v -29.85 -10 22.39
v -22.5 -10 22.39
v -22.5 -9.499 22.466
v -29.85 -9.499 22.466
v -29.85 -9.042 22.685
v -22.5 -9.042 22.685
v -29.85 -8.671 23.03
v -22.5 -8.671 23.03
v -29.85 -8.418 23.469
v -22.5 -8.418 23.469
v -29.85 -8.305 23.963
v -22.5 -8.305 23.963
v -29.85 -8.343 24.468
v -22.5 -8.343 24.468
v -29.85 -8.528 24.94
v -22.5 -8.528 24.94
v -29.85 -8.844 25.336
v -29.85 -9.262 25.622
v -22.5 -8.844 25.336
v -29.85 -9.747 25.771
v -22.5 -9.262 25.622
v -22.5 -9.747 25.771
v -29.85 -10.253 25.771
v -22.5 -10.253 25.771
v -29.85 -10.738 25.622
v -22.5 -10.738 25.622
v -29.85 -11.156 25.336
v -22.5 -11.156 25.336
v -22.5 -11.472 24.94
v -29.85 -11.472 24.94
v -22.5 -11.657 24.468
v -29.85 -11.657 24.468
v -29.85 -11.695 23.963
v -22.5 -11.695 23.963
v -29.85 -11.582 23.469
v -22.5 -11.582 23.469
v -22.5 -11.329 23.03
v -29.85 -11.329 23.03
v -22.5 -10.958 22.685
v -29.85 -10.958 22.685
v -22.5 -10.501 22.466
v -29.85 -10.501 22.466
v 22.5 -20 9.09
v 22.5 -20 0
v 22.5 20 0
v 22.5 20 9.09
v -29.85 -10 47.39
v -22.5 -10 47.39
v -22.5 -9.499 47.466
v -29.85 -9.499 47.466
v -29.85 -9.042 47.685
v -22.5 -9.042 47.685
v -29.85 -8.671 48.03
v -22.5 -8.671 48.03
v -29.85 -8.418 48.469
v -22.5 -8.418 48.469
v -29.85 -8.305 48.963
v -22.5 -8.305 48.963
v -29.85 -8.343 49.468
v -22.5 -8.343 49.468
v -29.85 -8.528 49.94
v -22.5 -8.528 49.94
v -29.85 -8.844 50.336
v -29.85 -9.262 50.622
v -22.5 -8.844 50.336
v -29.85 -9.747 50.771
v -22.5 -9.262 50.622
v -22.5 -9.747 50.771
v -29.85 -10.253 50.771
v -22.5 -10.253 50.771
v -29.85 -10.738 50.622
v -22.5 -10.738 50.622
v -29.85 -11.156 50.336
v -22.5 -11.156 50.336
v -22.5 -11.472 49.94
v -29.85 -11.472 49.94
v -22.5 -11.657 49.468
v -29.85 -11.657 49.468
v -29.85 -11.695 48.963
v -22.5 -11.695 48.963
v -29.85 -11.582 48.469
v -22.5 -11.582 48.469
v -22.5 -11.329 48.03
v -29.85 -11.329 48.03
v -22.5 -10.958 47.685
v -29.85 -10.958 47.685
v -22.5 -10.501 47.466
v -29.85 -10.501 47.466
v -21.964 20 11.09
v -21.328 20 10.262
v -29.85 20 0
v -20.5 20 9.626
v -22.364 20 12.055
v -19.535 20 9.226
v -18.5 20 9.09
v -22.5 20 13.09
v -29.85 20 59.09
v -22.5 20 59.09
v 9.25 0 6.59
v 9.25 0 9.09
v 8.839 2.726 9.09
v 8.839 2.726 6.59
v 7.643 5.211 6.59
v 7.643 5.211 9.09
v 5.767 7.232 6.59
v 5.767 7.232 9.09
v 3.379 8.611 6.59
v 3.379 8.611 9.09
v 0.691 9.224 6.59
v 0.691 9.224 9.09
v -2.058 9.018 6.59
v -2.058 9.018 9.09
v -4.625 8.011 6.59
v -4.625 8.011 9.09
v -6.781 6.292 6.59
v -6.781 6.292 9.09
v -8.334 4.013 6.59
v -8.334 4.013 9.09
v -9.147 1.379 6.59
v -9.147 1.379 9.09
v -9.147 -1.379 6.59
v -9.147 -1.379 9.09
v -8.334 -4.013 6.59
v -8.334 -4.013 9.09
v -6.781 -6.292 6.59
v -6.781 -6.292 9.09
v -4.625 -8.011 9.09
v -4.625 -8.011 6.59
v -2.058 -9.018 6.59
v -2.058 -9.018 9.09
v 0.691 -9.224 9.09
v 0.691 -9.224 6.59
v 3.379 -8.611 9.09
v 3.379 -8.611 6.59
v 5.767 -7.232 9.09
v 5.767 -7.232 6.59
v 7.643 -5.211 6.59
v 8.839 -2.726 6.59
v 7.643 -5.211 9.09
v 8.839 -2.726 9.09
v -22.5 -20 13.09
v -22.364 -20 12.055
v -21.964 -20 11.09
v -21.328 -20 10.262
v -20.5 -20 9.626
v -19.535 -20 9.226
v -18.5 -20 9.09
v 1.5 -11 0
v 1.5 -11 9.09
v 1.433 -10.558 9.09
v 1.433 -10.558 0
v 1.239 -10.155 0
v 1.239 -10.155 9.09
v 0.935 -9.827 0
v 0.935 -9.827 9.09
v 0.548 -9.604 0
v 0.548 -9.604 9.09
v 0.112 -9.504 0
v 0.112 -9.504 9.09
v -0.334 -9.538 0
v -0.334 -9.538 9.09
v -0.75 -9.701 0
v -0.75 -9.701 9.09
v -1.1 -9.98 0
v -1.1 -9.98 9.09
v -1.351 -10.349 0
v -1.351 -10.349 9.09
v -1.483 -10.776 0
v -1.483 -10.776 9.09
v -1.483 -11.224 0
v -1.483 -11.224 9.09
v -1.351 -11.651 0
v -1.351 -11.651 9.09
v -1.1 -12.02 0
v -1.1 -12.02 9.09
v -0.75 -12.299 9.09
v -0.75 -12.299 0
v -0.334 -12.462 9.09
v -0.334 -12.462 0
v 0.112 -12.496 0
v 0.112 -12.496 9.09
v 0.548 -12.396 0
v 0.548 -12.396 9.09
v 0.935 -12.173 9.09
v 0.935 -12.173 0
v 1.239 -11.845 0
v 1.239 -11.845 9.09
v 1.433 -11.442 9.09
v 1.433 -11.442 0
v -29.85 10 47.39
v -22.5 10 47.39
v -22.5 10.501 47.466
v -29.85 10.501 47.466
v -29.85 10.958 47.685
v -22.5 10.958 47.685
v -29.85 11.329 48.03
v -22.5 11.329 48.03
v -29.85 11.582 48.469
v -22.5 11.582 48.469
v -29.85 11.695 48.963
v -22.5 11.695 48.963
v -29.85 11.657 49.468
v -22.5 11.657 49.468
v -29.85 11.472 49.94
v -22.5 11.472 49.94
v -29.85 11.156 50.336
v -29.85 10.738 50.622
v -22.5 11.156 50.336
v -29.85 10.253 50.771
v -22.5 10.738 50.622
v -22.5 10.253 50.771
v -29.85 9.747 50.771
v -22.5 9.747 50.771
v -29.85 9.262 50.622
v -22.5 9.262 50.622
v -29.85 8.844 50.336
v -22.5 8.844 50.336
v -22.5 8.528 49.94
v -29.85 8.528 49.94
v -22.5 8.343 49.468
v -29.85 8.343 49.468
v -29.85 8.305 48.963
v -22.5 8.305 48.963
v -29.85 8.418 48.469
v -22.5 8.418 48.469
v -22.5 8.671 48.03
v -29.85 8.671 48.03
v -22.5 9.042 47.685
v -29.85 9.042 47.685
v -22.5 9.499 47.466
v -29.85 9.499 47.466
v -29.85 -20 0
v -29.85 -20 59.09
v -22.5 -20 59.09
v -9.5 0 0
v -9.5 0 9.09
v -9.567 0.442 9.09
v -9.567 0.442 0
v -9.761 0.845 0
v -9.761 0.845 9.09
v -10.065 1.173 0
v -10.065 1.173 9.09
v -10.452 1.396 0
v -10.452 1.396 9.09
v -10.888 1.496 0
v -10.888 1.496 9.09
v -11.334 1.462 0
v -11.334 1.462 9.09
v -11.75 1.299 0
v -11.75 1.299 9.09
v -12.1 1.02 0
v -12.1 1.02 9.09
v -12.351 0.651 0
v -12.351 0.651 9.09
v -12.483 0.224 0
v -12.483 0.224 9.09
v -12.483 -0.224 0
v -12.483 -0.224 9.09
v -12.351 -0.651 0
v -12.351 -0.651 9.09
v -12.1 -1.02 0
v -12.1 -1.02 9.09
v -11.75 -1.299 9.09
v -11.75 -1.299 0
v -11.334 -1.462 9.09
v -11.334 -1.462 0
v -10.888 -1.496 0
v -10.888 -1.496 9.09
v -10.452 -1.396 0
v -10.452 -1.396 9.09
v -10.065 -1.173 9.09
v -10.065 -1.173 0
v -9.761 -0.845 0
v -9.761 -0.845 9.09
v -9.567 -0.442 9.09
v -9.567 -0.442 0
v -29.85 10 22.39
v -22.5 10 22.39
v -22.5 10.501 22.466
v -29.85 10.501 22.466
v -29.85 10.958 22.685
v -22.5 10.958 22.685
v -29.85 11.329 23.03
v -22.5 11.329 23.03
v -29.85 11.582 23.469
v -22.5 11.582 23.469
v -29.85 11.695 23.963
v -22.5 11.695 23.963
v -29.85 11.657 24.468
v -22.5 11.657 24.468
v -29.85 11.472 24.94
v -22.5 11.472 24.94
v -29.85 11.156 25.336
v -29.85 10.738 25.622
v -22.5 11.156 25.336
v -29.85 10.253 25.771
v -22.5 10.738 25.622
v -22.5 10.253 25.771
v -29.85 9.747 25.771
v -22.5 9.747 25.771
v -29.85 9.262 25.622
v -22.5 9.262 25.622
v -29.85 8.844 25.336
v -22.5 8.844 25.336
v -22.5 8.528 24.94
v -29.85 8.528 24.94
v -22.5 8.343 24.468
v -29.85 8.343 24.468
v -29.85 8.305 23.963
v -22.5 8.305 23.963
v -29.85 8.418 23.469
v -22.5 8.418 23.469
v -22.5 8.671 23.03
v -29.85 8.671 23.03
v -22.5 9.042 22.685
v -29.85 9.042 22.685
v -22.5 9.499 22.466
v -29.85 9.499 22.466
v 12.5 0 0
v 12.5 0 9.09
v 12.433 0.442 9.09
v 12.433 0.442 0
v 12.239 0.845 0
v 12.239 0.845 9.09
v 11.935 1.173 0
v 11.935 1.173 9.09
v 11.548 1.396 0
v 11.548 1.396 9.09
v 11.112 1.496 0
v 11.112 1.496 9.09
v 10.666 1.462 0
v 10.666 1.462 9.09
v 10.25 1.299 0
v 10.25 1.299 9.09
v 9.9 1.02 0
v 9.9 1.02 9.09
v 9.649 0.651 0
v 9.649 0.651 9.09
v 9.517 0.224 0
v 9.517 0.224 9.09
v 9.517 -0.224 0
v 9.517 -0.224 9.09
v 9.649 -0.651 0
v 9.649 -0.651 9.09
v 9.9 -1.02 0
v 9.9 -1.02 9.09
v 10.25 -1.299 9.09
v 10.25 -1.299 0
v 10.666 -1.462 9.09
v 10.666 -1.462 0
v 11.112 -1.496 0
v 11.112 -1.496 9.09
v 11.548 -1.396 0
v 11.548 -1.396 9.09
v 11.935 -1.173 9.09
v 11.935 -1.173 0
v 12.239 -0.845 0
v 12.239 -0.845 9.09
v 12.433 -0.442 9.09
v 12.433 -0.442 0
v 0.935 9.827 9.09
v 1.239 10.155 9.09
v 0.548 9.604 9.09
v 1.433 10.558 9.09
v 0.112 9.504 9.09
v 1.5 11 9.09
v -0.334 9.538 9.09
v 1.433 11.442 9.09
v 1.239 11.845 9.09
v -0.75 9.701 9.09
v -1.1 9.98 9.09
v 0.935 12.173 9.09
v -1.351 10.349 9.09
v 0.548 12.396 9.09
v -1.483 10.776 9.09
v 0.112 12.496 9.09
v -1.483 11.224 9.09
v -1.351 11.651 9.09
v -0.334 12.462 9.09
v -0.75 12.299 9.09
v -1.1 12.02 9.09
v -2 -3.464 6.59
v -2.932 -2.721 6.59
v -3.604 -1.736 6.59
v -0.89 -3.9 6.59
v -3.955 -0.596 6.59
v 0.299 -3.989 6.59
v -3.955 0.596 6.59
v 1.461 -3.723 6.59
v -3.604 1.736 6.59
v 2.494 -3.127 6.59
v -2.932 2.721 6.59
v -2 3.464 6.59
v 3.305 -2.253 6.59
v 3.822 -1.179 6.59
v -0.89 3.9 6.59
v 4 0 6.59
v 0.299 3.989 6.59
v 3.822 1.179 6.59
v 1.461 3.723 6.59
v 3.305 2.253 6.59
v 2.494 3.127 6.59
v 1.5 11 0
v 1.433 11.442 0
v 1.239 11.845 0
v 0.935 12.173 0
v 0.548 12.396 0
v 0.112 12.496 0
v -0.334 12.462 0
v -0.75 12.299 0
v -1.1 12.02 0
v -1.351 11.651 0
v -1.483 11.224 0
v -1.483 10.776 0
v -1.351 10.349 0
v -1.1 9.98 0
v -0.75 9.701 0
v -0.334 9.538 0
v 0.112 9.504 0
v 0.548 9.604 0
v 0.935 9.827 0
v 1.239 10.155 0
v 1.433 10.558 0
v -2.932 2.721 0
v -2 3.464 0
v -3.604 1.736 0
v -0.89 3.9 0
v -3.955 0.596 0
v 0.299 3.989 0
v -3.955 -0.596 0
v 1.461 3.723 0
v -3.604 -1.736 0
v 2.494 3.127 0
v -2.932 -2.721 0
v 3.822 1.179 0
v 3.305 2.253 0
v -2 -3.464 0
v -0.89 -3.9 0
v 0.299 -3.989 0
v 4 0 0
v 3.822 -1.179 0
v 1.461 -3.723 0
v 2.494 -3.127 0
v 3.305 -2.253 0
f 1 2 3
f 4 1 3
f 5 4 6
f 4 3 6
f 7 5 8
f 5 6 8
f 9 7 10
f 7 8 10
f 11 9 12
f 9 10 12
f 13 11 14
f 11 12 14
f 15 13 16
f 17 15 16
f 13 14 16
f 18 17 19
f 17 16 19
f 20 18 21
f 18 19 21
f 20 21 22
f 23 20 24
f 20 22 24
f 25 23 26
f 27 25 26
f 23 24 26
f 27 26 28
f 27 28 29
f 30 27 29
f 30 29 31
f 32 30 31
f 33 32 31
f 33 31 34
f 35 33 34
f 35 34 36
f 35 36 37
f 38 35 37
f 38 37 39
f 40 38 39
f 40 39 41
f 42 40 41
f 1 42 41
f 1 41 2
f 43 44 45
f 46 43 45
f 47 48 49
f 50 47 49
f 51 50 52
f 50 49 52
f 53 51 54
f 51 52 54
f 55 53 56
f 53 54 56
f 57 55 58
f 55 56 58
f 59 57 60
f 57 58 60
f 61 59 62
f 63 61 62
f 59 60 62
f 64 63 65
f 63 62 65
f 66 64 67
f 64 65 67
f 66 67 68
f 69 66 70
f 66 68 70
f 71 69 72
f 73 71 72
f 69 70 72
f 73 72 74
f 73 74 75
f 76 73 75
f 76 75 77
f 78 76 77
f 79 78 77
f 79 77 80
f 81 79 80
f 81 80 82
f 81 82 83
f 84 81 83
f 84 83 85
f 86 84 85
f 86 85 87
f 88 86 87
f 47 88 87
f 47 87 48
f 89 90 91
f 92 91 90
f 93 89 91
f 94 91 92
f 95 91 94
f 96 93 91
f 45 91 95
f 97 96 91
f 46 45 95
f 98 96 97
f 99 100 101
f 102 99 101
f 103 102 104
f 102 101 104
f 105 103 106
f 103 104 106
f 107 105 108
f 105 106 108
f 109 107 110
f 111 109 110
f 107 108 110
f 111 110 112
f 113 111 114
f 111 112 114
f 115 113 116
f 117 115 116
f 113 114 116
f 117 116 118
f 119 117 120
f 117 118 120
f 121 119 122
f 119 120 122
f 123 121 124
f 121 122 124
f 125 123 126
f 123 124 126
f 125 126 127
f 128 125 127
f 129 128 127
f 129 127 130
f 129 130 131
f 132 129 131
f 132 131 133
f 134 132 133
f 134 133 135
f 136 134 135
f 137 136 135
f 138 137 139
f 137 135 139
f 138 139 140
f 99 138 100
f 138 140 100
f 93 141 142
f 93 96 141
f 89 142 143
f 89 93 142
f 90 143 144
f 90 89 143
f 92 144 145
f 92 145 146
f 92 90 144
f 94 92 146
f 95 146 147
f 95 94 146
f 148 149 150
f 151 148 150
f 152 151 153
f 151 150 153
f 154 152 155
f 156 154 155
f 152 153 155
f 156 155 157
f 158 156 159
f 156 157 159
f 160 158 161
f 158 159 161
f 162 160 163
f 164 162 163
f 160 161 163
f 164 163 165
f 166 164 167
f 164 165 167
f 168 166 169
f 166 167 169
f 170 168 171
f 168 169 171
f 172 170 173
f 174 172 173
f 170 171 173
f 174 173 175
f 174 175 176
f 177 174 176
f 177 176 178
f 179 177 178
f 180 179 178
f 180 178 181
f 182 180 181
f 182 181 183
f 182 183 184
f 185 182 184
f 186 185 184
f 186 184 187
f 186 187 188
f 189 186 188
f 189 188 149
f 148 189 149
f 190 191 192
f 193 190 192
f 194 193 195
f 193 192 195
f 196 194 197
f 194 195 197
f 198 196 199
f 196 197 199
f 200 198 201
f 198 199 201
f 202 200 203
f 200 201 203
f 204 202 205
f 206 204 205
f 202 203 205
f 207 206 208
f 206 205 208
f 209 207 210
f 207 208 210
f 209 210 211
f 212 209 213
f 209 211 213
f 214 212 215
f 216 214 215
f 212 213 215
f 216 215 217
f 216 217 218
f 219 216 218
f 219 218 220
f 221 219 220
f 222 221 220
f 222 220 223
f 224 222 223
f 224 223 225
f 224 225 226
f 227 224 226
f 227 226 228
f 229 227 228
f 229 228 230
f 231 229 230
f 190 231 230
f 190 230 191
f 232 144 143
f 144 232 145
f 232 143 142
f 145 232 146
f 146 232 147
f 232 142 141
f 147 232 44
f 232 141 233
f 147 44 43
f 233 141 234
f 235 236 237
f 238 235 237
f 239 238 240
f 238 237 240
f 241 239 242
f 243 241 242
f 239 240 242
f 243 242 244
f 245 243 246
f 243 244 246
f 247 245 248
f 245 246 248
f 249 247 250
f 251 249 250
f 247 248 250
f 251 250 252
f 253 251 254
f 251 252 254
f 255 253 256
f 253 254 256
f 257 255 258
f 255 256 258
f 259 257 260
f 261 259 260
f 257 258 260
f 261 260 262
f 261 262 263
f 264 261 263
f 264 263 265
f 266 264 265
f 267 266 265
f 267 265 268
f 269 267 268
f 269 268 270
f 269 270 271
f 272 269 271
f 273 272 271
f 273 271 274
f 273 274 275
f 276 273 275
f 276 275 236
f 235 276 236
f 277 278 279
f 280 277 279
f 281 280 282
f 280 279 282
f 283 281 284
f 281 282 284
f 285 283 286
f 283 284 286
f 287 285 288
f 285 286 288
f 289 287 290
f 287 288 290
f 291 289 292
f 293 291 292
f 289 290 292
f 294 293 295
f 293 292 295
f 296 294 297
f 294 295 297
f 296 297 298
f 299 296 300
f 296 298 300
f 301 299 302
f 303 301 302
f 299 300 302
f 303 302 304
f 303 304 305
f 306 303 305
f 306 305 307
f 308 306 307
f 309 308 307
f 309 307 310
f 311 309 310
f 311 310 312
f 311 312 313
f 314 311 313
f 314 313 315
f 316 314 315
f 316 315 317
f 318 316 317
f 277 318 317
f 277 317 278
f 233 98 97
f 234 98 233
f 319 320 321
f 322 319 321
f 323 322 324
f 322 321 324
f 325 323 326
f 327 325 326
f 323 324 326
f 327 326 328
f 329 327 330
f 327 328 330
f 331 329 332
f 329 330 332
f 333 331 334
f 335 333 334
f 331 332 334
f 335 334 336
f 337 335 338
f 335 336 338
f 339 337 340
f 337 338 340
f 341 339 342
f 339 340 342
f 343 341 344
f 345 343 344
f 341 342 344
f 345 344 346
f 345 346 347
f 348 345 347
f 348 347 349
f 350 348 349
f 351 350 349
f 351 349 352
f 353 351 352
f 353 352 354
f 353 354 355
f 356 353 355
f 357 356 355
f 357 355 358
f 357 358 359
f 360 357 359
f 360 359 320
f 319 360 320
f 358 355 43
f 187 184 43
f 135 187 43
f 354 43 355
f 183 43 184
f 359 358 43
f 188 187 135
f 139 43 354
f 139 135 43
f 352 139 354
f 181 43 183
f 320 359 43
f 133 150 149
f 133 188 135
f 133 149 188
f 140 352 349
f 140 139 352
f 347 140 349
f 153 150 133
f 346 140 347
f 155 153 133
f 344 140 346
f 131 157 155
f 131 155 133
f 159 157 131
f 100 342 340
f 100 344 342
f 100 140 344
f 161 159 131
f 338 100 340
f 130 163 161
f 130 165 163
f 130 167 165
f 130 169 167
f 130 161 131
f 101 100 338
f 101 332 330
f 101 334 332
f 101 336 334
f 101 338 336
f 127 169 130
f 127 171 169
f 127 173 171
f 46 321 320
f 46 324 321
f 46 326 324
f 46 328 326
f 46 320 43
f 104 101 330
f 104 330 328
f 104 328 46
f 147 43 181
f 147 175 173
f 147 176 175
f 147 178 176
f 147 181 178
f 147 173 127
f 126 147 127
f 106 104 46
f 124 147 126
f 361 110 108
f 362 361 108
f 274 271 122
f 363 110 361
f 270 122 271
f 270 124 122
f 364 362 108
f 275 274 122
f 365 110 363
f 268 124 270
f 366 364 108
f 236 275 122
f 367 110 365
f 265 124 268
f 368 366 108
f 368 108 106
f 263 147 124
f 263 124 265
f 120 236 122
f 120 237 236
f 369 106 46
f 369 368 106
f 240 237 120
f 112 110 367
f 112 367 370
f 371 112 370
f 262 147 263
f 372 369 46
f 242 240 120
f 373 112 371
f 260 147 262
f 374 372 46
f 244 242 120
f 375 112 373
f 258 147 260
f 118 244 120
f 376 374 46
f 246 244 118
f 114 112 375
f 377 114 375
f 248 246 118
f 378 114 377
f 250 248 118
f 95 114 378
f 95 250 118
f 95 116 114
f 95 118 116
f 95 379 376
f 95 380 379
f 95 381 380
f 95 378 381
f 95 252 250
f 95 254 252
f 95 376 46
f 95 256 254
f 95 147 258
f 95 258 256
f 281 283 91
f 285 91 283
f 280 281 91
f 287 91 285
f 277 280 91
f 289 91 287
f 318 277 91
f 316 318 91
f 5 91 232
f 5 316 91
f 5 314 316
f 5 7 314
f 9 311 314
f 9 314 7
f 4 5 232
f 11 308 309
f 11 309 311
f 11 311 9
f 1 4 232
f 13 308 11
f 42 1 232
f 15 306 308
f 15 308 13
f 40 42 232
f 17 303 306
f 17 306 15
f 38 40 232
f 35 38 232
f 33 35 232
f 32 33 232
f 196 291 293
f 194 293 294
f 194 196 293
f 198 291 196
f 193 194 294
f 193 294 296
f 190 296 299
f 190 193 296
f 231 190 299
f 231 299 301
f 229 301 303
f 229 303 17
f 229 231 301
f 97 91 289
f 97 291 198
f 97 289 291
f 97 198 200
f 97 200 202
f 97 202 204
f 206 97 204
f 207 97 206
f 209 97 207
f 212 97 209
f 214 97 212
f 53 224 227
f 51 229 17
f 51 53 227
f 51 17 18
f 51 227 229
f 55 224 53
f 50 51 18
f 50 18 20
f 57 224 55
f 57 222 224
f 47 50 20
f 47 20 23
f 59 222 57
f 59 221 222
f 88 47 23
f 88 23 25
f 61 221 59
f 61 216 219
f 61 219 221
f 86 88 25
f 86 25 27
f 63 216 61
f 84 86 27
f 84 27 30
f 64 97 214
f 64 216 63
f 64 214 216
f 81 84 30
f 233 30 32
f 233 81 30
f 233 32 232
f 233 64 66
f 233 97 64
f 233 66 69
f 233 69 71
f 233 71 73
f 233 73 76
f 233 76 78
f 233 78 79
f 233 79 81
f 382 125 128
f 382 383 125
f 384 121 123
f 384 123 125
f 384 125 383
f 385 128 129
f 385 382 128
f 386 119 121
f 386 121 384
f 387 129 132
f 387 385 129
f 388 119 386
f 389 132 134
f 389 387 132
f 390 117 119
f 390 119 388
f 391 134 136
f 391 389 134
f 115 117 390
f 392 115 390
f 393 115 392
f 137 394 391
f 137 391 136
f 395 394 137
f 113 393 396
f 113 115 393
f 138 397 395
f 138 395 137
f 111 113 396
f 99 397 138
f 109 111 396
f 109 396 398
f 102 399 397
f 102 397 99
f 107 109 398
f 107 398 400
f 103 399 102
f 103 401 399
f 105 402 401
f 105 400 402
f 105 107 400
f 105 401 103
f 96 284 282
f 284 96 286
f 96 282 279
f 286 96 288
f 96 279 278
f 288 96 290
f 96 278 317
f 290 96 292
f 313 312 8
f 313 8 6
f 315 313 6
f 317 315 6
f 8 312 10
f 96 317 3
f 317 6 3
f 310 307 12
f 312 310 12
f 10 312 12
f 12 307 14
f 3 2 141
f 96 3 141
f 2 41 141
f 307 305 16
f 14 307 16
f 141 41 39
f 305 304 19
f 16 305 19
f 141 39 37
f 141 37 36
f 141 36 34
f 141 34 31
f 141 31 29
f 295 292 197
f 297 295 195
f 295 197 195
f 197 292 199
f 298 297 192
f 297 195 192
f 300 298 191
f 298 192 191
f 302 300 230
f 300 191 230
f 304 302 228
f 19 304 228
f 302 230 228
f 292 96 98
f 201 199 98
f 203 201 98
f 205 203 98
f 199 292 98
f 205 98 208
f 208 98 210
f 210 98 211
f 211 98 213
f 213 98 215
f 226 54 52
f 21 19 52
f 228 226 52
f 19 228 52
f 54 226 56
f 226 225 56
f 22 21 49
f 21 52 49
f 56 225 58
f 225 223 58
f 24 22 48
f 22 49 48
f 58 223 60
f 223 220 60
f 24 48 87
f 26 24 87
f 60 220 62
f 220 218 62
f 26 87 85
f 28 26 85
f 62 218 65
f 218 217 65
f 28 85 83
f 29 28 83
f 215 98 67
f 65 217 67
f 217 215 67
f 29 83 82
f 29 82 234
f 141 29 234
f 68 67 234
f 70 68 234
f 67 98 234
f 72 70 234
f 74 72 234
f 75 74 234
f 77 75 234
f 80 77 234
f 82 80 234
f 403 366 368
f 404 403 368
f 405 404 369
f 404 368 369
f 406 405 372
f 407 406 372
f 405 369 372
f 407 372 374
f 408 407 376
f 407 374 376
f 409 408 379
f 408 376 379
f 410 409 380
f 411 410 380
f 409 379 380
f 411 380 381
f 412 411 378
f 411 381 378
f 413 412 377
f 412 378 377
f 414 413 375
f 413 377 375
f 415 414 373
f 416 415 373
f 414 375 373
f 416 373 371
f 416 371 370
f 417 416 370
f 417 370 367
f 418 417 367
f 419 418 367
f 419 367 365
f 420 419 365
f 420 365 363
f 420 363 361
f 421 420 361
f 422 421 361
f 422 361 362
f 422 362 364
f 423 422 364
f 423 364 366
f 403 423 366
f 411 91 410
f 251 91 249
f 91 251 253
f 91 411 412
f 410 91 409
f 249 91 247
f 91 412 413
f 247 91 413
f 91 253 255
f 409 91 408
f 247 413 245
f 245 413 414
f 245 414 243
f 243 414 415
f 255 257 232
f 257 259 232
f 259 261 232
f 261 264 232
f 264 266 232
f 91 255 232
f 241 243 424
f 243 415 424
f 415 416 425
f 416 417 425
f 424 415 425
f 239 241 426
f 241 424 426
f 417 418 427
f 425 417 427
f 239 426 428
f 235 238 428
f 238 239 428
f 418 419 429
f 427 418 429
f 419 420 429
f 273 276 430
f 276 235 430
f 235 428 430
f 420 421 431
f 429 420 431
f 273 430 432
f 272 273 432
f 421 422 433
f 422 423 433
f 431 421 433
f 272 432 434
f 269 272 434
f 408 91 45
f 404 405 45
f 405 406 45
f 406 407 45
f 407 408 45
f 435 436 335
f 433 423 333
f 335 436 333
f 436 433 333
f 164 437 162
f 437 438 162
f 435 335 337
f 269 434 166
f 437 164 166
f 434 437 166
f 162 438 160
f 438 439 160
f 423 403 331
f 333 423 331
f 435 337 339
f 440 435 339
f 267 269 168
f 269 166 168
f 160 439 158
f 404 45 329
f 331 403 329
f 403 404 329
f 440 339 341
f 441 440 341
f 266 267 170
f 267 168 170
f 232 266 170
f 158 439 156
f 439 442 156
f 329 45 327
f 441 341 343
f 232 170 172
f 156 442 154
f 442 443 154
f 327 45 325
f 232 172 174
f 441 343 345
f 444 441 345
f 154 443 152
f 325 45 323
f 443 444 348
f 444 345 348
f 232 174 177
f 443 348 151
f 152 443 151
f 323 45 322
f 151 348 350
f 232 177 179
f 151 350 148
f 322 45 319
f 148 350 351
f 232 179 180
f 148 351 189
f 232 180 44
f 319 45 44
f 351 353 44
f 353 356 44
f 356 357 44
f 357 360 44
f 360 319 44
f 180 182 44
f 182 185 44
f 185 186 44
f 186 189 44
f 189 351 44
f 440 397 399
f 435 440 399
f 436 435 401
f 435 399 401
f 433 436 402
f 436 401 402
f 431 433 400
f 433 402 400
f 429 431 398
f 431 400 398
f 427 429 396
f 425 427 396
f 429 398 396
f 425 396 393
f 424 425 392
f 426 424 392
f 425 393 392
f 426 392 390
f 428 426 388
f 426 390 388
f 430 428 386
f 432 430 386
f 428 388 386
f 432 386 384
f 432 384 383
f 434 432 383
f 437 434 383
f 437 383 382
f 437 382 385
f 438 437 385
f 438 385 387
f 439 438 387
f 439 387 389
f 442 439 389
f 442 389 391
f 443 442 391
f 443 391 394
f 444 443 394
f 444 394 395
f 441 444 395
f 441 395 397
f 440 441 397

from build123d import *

# Parameters (mm, degrees)
SKETCH1_W           = 40
SKETCH1_H           = 45
BOSS_EXTRUDE1_DEPTH = 9.09
SKETCH2_R           = 1.5
CUT_EXTRUDE1_DEPTH  = 32.44643223
SKETCH3_R           = 9.25
CUT_EXTRUDE4_DEPTH  = 2.5
SKETCH4_R           = 4
CUT_EXTRUDE5_DEPTH  = 31.816847665
SKETCH5_W           = 40
SKETCH5_H           = 59.09
BOSS_EXTRUDE2_DEPTH = 7.35
SKETCH6_R           = 1.7
CUT_EXTRUDE6_DEPTH  = 77.919621034
FILLET1_R           = 4


with BuildPart() as part:
    # Sketch1 → Boss-Extrude1 (new body)
    with BuildSketch(Plane(origin=(0, 0, 0), x_dir=(0, 1, 0), z_dir=(0, 0, 1))):
        Rectangle(SKETCH1_W, SKETCH1_H)
    extrude(amount=BOSS_EXTRUDE1_DEPTH)

    # Sketch2 → Cut-Extrude1 (cut, through all)
    with BuildSketch(Plane.XY.offset(9.09)):
        with Locations((0, 11)):
            Circle(SKETCH2_R)
        with Locations((11, 0)):
            Circle(SKETCH2_R)
        with Locations((0, -11)):
            Circle(SKETCH2_R)
        with Locations((-11, 0)):
            Circle(SKETCH2_R)
    extrude(amount=-CUT_EXTRUDE1_DEPTH, mode=Mode.SUBTRACT)

    # Sketch3 → Cut-Extrude4 (cut)
    with BuildSketch(Plane.XY.offset(9.09)):
        Circle(SKETCH3_R)
    extrude(amount=-CUT_EXTRUDE4_DEPTH, mode=Mode.SUBTRACT)

    # Sketch4 → Cut-Extrude5 (cut, through all)
    with BuildSketch(Plane.XY.offset(6.59)):
        Circle(SKETCH4_R)
    extrude(amount=-CUT_EXTRUDE5_DEPTH, mode=Mode.SUBTRACT)

    # Sketch5 → Boss-Extrude2 (add)
    with BuildSketch(Plane(origin=(-22.5, 0, 0), x_dir=(0, -1, 0), z_dir=(-1, 0, 0))):
        with Locations((0, 29.545)):
            Rectangle(SKETCH5_W, SKETCH5_H)
    extrude(amount=BOSS_EXTRUDE2_DEPTH)

    # Sketch6 → Cut-Extrude6 (cut, through all)
    with BuildSketch(Plane.YZ.offset(-22.5)):
        with Locations(Location((-10, 49.09, 0), (0, 0, 270))):
            Circle(SKETCH6_R)
        with Locations(Location((10, 49.09, 0), (0, 0, 270))):
            Circle(SKETCH6_R)
        with Locations(Location((-10, 24.09, 0), (0, 0, 270))):
            Circle(SKETCH6_R)
        with Locations(Location((10, 24.09, 0), (0, 0, 270))):
            Circle(SKETCH6_R)
    extrude(amount=-CUT_EXTRUDE6_DEPTH, mode=Mode.SUBTRACT)

    # Fillet1
    fillet1_edges = [part.edges().sort_by_distance(p)[0] for p in [
        (-22.5, 0, 9.09),
    ]]
    fillet(fillet1_edges, radius=FILLET1_R)


solid = part.part
